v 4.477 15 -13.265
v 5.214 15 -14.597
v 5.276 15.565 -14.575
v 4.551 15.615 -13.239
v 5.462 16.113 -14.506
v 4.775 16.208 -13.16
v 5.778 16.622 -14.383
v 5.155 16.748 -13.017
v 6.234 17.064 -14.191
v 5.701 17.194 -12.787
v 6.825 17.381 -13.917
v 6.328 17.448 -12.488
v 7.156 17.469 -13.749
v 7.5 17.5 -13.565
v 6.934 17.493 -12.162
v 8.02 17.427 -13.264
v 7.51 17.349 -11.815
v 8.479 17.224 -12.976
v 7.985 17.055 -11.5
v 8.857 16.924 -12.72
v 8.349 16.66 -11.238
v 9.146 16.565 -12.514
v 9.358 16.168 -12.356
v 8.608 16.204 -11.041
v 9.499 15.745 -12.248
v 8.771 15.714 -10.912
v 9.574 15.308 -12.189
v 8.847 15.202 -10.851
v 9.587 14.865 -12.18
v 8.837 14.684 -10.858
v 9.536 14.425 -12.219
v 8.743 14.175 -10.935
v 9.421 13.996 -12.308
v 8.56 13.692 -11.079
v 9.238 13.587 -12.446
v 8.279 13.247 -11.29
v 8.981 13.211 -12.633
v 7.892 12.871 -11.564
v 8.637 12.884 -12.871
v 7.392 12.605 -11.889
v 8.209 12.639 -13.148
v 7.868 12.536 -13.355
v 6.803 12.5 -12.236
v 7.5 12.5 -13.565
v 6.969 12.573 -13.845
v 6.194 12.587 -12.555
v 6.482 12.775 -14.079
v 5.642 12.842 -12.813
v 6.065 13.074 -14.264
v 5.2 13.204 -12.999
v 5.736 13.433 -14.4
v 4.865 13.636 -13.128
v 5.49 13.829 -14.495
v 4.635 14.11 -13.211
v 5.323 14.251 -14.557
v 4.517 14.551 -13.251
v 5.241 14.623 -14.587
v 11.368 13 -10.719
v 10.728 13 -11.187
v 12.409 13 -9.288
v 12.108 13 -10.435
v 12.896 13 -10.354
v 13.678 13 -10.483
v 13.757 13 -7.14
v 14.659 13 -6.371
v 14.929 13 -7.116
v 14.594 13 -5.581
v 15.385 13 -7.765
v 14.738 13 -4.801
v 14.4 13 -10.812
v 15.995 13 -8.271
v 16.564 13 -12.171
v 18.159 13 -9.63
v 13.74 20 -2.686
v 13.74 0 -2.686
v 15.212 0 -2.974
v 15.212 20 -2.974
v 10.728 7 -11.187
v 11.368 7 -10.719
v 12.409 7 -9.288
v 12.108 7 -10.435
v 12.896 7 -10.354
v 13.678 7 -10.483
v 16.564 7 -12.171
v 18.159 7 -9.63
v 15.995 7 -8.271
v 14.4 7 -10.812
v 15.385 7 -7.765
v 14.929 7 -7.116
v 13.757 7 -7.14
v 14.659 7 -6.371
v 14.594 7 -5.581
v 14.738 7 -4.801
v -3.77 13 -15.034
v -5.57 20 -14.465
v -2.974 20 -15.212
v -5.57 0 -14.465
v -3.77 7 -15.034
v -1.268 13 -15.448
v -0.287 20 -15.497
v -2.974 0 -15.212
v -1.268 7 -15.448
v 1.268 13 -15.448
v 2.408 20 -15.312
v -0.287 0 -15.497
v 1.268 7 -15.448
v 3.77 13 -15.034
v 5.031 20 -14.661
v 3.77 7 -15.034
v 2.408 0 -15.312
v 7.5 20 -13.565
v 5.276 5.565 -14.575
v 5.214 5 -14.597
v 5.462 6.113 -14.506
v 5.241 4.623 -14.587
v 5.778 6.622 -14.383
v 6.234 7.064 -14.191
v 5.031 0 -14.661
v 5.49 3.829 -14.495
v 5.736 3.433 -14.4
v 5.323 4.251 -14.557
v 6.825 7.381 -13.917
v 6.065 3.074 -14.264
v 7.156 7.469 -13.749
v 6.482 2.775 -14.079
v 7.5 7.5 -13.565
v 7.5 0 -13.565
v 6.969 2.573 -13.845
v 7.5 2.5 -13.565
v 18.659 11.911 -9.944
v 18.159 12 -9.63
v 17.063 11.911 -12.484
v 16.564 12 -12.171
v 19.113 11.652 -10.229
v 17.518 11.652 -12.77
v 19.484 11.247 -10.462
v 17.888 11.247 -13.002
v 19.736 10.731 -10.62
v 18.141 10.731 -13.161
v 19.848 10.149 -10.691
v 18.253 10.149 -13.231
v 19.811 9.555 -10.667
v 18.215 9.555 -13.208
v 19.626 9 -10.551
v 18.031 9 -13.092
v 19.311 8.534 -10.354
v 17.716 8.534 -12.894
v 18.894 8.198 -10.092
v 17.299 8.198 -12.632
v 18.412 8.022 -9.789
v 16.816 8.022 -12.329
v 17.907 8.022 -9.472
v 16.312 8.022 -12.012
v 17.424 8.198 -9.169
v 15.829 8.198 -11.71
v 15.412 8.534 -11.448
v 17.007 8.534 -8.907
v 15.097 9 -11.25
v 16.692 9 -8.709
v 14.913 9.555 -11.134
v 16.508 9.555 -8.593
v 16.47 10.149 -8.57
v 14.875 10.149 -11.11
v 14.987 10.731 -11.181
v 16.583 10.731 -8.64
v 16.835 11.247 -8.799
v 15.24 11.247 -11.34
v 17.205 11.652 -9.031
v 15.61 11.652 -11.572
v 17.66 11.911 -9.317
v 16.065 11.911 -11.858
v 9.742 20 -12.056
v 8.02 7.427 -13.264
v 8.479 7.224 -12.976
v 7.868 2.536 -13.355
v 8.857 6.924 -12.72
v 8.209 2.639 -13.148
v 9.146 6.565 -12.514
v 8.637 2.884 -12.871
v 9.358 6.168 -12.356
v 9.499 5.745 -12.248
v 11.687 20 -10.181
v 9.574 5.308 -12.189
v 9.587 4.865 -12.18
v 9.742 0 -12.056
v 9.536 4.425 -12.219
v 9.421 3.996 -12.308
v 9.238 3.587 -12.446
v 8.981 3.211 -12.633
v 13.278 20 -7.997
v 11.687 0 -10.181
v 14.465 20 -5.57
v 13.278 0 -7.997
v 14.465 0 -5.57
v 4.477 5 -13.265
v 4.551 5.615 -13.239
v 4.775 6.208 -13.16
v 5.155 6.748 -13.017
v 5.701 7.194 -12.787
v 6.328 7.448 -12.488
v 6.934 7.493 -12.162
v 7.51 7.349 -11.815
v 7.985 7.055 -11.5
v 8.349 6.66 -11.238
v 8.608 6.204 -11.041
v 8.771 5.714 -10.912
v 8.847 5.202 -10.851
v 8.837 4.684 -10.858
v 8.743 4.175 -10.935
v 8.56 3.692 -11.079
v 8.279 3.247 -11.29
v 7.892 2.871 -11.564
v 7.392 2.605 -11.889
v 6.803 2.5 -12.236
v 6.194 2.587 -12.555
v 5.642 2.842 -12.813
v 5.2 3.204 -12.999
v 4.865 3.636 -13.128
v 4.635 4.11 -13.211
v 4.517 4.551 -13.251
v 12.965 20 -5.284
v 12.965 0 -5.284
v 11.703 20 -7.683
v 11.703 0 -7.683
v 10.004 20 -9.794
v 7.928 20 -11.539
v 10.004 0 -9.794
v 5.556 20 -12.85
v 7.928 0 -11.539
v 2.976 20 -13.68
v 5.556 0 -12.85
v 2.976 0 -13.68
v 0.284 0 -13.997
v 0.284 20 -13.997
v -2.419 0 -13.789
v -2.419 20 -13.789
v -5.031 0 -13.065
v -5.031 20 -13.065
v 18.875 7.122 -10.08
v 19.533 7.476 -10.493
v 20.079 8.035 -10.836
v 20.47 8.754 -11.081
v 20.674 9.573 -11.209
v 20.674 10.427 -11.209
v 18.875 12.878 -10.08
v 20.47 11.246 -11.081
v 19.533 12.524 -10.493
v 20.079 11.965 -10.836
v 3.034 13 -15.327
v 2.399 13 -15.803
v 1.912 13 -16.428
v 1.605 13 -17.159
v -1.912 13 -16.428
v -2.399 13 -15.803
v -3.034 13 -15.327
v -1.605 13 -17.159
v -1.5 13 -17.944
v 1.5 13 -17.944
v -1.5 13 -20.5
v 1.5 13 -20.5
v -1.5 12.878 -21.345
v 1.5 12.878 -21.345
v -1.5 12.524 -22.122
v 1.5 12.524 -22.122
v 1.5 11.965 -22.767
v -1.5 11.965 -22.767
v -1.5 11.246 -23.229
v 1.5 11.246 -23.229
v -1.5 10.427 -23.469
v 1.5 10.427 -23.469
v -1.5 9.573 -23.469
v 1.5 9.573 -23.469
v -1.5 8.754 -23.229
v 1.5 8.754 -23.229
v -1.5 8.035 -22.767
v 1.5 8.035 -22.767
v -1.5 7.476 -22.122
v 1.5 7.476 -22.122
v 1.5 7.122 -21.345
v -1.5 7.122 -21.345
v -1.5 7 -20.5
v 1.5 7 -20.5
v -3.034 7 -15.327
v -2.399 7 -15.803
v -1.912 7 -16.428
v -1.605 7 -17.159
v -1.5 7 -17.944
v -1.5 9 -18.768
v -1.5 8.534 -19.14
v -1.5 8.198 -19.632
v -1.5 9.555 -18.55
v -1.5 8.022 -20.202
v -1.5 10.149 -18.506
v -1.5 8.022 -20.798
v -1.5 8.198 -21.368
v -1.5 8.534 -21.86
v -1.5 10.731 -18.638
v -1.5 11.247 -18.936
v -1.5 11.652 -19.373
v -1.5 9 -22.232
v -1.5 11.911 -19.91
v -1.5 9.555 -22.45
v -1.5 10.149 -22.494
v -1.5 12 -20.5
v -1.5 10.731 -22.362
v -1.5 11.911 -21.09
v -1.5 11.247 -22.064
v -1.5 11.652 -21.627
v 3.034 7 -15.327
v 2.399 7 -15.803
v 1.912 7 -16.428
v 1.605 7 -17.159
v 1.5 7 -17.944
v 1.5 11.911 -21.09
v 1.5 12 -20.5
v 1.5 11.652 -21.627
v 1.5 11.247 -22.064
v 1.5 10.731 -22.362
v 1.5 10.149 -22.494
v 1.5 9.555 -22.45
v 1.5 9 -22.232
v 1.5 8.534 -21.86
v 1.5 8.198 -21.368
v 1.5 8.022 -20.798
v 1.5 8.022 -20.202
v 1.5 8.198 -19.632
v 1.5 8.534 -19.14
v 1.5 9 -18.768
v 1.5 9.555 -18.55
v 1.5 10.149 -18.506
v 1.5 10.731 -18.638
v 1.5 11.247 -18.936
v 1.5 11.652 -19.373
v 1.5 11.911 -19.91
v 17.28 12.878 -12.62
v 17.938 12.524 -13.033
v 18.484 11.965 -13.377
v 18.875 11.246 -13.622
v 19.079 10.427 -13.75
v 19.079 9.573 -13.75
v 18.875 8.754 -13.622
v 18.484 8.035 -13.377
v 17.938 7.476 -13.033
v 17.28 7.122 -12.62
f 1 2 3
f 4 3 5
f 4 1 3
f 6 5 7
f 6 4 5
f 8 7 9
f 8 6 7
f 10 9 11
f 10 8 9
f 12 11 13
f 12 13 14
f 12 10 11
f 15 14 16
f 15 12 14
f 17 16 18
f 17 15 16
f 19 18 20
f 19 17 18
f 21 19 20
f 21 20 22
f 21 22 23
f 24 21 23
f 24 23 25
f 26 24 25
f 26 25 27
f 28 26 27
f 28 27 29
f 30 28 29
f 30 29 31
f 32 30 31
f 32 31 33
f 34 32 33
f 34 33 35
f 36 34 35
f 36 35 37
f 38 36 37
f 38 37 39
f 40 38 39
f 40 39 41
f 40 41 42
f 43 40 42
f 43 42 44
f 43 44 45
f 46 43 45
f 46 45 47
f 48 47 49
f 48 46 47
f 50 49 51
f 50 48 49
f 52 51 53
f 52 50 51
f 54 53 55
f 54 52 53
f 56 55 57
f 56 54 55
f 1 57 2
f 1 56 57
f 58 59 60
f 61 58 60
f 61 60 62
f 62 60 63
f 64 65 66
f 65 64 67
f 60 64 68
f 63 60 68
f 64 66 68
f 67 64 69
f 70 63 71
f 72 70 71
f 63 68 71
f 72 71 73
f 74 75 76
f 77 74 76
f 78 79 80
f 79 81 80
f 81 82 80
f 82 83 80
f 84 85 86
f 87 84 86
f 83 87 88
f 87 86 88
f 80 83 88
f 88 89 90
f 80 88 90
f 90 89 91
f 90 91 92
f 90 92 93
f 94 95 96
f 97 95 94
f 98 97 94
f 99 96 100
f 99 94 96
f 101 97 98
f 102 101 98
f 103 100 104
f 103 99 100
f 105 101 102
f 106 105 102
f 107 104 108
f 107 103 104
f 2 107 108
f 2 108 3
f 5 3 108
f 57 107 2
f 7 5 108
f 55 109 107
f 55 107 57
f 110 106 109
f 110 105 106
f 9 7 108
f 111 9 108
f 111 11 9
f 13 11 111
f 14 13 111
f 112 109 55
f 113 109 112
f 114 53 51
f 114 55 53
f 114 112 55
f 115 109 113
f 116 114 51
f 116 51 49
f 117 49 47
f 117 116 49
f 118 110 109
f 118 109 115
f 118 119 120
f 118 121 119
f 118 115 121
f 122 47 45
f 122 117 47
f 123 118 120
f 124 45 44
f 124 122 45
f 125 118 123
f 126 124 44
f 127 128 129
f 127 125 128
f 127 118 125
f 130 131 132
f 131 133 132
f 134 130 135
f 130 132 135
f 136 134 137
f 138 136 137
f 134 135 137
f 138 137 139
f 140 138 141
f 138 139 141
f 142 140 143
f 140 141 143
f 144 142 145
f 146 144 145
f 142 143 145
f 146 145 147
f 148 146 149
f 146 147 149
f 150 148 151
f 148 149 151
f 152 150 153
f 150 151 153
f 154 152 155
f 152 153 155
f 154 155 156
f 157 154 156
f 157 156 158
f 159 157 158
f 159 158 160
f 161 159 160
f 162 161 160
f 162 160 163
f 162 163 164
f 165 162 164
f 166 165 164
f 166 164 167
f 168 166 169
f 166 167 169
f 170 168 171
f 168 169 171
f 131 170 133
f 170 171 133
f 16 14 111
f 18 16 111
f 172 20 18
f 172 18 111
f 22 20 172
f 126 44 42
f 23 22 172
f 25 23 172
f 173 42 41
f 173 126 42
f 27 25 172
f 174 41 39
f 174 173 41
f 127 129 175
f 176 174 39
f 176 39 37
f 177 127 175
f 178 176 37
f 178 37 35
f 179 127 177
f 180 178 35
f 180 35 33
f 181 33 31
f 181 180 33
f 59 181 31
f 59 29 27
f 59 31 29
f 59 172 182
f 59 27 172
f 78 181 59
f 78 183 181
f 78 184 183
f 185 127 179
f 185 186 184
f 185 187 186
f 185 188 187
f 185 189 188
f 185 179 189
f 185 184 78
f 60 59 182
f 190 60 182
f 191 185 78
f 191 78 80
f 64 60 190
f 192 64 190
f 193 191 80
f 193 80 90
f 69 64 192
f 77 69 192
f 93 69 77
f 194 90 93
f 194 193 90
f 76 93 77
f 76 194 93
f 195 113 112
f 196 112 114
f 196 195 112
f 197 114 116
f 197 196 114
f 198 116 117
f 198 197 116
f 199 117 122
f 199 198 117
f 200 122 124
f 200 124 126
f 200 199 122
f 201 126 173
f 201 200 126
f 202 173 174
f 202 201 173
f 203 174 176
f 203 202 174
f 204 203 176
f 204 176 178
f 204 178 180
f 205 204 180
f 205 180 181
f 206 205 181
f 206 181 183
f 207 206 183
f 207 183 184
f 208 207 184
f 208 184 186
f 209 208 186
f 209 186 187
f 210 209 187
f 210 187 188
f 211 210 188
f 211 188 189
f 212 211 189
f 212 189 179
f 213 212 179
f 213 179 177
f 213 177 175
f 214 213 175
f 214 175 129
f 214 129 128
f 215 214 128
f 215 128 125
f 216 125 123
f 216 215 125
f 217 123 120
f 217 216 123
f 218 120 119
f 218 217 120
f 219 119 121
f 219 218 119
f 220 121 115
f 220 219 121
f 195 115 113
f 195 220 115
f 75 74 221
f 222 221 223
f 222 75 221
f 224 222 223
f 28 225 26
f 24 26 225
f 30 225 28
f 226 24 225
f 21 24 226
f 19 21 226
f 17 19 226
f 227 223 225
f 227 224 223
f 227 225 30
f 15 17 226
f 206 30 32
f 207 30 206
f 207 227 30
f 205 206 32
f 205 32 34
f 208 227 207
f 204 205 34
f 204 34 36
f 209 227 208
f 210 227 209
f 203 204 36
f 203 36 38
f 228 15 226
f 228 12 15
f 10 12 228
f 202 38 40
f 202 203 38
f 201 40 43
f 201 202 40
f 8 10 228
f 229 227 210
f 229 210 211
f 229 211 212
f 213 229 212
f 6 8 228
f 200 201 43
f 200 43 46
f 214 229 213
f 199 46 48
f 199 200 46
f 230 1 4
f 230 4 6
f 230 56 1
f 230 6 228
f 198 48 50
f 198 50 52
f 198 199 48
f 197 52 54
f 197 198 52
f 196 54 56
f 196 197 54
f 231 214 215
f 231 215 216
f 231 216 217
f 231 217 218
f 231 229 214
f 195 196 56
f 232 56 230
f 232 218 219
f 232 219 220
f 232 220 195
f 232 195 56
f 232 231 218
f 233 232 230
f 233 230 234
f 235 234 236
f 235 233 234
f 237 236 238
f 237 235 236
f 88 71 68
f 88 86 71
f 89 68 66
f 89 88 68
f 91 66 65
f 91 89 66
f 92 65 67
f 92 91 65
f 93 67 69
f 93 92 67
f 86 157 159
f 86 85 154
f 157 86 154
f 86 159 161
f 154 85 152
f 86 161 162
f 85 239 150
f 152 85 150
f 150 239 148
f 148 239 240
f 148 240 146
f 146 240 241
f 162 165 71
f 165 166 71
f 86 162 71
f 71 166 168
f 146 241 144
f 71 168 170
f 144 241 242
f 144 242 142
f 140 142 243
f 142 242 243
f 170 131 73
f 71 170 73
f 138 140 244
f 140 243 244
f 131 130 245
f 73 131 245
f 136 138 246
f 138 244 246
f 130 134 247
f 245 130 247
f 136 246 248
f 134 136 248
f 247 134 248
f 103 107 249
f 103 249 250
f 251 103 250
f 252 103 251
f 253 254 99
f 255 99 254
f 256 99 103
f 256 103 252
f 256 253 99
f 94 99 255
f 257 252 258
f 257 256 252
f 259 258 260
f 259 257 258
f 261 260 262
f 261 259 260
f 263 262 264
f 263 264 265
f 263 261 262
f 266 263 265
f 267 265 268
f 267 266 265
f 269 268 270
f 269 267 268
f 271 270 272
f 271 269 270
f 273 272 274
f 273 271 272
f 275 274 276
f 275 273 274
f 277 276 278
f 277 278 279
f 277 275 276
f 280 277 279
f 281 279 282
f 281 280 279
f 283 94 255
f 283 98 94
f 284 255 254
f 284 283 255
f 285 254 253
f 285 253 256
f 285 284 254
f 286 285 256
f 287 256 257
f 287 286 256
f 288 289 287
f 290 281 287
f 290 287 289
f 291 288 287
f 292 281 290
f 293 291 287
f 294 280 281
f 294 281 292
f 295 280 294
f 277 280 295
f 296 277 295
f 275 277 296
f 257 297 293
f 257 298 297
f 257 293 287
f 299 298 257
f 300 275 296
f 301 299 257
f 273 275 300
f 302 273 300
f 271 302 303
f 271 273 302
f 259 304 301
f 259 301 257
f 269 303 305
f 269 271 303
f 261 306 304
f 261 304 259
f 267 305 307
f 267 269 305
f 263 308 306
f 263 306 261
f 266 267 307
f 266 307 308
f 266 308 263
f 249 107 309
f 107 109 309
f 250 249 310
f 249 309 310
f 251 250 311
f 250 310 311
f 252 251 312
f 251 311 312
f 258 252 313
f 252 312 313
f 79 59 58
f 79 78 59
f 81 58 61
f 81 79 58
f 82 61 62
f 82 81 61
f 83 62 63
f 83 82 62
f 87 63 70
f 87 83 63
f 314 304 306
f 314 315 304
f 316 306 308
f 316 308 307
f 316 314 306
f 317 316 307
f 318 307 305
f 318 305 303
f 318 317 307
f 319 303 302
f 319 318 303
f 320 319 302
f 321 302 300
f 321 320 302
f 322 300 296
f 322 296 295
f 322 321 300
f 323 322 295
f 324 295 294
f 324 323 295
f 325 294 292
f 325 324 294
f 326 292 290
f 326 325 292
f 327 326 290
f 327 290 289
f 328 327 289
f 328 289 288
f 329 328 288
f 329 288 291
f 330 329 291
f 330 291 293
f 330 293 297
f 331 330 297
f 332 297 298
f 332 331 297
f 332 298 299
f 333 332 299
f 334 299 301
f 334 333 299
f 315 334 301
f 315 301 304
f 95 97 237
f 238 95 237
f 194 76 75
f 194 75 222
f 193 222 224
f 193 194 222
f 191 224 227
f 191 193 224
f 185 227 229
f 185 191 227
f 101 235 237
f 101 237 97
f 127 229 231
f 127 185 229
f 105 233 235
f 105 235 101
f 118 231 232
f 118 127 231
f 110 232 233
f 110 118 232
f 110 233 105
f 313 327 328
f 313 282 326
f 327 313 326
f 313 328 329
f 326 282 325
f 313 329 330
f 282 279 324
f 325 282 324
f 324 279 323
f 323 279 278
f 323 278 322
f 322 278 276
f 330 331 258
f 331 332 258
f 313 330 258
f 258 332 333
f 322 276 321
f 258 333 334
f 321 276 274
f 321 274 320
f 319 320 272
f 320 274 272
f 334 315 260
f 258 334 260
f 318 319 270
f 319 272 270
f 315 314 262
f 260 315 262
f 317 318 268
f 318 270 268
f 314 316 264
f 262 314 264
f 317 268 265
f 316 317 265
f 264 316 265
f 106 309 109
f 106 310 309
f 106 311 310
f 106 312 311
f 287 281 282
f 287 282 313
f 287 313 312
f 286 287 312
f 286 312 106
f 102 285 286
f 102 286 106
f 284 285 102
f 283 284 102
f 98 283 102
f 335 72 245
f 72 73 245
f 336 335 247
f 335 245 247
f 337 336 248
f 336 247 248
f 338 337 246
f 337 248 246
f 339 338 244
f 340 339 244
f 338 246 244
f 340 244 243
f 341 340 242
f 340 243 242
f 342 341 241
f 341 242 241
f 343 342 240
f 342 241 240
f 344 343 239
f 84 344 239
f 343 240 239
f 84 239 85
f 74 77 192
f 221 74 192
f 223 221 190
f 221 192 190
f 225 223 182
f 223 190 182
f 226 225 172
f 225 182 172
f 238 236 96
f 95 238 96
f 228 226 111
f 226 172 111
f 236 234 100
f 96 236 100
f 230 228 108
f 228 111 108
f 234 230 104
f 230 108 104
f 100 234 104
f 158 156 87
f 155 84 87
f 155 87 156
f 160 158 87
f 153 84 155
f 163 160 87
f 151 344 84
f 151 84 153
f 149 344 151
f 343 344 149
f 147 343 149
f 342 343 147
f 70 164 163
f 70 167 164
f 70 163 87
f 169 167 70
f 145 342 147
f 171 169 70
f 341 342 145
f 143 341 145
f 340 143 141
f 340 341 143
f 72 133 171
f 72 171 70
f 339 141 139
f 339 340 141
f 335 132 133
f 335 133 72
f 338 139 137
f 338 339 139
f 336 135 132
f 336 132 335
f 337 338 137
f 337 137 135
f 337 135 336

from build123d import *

# Parameters (mm, degrees)
SKETCH2_R               = 15.5
SKETCH2_R_2             = 14
BOSS_EXTRUDE1_DEPTH     = 20
SKETCH3_OUTSIDE_W       = 42.638
SKETCH3_OUTSIDE_H       = 42.638
CUT_EXTRUDE1_DEPTH      = 21
SKETCH6_R               = 2
BOSS_EXTRUDE2_DEPTH     = 1.5
CUT_EXTRUDE4_DEPTH      = 21
CUT_EXTRUDE4_DEPTH_BACK = 10
SKETCH9_R               = 2.5
CUT_EXTRUDE5_DEPTH      = 10
FILLET1_R               = 3


with BuildPart() as part:
    # Sketch2 → Boss-Extrude1 (new body)
    with BuildSketch(Plane(origin=(0, 0, 0), x_dir=(1, 0, 0), z_dir=(0, 1, 0))):
        Circle(SKETCH2_R)
        Circle(SKETCH2_R_2, mode=Mode.SUBTRACT)
    boss_extrude1 = extrude(amount=BOSS_EXTRUDE1_DEPTH)

    # Sketch3 outside → Cut-Extrude1 (cut, through all)
    with BuildSketch(Plane(origin=(0, 20, 0), x_dir=(1, 0, 0), z_dir=(0, 1, 0))):
        Rectangle(SKETCH3_OUTSIDE_W, SKETCH3_OUTSIDE_H)
        with BuildLine():
            Line((0, 0), (7.5, 13.564659966))
            ThreePointArc((7.5, 13.564659966), (0, 15.5), (-7.5, 13.564659966))
            Line((-7.5, 13.564659966), (0, 0))
        make_face(mode=Mode.SUBTRACT)
    extrude(amount=-CUT_EXTRUDE1_DEPTH, mode=Mode.SUBTRACT)

    # Sketch6 → Boss-Extrude2 (add, symmetric)
    with BuildSketch(Plane(origin=(0, 7.5, 0), x_dir=(0, 1, 0), z_dir=(-1, 0, 0))):
        with BuildLine():
            Line((-0.5, 20.5), (-0.5, 15.25))
            Line((-0.5, 15.25), (5.5, 15.25))
            Line((5.5, 15.25), (5.5, 20.5))
            ThreePointArc((5.5, 20.5), (2.5, 23.5), (-0.5, 20.5))
        make_face()
        with Locations((2.5, 20.5)):
            Circle(SKETCH6_R, mode=Mode.SUBTRACT)
    boss_extrude2 = extrude(amount=BOSS_EXTRUDE2_DEPTH, both=True)

    # Mirror2: Boss-Extrude1, Boss-Extrude2 across plane
    add(boss_extrude1.mirror(Plane(origin=(0, 0, 0), x_dir=(-0.483870968, 0, 0.875139353), z_dir=(0.875139353, 0, 0.483870968))))
    add(boss_extrude2.mirror(Plane(origin=(0, 0, 0), x_dir=(-0.483870968, 0, 0.875139353), z_dir=(0.875139353, 0, 0.483870968))))

    # Sketch8 → Cut-Extrude4 (cut, two sides)
    with BuildSketch(Plane(origin=(0, 0, 0), x_dir=(1, 0, 0), z_dir=(0, 1, 0))) as cut_extrude4_sk:
        with BuildLine():
            Line((-5.570225317, 14.464528679), (0, 0))
            Line((0, 0), (15.212039463, 2.973862033))
            ThreePointArc((15.212039463, 2.973862033), (-7.5, -13.564659966), (-5.570225317, 14.464528679))
        make_face()
    extrude(amount=CUT_EXTRUDE4_DEPTH, mode=Mode.SUBTRACT)
    extrude(cut_extrude4_sk.sketch, amount=-CUT_EXTRUDE4_DEPTH_BACK, mode=Mode.SUBTRACT)

    # Sketch9 → Cut-Extrude5 (cut)
    with BuildSketch(Plane(origin=(4.354367679, 0, -7.875402257), x_dir=(-0.875139353, 0, -0.483870968), z_dir=(0.483870968, 0, -0.875139353))):
        with Locations((0, 15)):
            Circle(SKETCH9_R)
        with Locations((0, 5)):
            Circle(SKETCH9_R)
    extrude(amount=CUT_EXTRUDE5_DEPTH, mode=Mode.SUBTRACT)

    # Fillet1
    fillet1_edges = [part.edges().sort_by_distance(p)[0] for p in [
        (-1.5, 10, -15.427248621),
        (1.5, 10, -15.427248621),
        (13.863083148, 10, -6.932887251),
        (12.267869828, 10, -9.473614404),
    ]]
    fillet(fillet1_edges, radius=FILLET1_R)


solid = part.part
